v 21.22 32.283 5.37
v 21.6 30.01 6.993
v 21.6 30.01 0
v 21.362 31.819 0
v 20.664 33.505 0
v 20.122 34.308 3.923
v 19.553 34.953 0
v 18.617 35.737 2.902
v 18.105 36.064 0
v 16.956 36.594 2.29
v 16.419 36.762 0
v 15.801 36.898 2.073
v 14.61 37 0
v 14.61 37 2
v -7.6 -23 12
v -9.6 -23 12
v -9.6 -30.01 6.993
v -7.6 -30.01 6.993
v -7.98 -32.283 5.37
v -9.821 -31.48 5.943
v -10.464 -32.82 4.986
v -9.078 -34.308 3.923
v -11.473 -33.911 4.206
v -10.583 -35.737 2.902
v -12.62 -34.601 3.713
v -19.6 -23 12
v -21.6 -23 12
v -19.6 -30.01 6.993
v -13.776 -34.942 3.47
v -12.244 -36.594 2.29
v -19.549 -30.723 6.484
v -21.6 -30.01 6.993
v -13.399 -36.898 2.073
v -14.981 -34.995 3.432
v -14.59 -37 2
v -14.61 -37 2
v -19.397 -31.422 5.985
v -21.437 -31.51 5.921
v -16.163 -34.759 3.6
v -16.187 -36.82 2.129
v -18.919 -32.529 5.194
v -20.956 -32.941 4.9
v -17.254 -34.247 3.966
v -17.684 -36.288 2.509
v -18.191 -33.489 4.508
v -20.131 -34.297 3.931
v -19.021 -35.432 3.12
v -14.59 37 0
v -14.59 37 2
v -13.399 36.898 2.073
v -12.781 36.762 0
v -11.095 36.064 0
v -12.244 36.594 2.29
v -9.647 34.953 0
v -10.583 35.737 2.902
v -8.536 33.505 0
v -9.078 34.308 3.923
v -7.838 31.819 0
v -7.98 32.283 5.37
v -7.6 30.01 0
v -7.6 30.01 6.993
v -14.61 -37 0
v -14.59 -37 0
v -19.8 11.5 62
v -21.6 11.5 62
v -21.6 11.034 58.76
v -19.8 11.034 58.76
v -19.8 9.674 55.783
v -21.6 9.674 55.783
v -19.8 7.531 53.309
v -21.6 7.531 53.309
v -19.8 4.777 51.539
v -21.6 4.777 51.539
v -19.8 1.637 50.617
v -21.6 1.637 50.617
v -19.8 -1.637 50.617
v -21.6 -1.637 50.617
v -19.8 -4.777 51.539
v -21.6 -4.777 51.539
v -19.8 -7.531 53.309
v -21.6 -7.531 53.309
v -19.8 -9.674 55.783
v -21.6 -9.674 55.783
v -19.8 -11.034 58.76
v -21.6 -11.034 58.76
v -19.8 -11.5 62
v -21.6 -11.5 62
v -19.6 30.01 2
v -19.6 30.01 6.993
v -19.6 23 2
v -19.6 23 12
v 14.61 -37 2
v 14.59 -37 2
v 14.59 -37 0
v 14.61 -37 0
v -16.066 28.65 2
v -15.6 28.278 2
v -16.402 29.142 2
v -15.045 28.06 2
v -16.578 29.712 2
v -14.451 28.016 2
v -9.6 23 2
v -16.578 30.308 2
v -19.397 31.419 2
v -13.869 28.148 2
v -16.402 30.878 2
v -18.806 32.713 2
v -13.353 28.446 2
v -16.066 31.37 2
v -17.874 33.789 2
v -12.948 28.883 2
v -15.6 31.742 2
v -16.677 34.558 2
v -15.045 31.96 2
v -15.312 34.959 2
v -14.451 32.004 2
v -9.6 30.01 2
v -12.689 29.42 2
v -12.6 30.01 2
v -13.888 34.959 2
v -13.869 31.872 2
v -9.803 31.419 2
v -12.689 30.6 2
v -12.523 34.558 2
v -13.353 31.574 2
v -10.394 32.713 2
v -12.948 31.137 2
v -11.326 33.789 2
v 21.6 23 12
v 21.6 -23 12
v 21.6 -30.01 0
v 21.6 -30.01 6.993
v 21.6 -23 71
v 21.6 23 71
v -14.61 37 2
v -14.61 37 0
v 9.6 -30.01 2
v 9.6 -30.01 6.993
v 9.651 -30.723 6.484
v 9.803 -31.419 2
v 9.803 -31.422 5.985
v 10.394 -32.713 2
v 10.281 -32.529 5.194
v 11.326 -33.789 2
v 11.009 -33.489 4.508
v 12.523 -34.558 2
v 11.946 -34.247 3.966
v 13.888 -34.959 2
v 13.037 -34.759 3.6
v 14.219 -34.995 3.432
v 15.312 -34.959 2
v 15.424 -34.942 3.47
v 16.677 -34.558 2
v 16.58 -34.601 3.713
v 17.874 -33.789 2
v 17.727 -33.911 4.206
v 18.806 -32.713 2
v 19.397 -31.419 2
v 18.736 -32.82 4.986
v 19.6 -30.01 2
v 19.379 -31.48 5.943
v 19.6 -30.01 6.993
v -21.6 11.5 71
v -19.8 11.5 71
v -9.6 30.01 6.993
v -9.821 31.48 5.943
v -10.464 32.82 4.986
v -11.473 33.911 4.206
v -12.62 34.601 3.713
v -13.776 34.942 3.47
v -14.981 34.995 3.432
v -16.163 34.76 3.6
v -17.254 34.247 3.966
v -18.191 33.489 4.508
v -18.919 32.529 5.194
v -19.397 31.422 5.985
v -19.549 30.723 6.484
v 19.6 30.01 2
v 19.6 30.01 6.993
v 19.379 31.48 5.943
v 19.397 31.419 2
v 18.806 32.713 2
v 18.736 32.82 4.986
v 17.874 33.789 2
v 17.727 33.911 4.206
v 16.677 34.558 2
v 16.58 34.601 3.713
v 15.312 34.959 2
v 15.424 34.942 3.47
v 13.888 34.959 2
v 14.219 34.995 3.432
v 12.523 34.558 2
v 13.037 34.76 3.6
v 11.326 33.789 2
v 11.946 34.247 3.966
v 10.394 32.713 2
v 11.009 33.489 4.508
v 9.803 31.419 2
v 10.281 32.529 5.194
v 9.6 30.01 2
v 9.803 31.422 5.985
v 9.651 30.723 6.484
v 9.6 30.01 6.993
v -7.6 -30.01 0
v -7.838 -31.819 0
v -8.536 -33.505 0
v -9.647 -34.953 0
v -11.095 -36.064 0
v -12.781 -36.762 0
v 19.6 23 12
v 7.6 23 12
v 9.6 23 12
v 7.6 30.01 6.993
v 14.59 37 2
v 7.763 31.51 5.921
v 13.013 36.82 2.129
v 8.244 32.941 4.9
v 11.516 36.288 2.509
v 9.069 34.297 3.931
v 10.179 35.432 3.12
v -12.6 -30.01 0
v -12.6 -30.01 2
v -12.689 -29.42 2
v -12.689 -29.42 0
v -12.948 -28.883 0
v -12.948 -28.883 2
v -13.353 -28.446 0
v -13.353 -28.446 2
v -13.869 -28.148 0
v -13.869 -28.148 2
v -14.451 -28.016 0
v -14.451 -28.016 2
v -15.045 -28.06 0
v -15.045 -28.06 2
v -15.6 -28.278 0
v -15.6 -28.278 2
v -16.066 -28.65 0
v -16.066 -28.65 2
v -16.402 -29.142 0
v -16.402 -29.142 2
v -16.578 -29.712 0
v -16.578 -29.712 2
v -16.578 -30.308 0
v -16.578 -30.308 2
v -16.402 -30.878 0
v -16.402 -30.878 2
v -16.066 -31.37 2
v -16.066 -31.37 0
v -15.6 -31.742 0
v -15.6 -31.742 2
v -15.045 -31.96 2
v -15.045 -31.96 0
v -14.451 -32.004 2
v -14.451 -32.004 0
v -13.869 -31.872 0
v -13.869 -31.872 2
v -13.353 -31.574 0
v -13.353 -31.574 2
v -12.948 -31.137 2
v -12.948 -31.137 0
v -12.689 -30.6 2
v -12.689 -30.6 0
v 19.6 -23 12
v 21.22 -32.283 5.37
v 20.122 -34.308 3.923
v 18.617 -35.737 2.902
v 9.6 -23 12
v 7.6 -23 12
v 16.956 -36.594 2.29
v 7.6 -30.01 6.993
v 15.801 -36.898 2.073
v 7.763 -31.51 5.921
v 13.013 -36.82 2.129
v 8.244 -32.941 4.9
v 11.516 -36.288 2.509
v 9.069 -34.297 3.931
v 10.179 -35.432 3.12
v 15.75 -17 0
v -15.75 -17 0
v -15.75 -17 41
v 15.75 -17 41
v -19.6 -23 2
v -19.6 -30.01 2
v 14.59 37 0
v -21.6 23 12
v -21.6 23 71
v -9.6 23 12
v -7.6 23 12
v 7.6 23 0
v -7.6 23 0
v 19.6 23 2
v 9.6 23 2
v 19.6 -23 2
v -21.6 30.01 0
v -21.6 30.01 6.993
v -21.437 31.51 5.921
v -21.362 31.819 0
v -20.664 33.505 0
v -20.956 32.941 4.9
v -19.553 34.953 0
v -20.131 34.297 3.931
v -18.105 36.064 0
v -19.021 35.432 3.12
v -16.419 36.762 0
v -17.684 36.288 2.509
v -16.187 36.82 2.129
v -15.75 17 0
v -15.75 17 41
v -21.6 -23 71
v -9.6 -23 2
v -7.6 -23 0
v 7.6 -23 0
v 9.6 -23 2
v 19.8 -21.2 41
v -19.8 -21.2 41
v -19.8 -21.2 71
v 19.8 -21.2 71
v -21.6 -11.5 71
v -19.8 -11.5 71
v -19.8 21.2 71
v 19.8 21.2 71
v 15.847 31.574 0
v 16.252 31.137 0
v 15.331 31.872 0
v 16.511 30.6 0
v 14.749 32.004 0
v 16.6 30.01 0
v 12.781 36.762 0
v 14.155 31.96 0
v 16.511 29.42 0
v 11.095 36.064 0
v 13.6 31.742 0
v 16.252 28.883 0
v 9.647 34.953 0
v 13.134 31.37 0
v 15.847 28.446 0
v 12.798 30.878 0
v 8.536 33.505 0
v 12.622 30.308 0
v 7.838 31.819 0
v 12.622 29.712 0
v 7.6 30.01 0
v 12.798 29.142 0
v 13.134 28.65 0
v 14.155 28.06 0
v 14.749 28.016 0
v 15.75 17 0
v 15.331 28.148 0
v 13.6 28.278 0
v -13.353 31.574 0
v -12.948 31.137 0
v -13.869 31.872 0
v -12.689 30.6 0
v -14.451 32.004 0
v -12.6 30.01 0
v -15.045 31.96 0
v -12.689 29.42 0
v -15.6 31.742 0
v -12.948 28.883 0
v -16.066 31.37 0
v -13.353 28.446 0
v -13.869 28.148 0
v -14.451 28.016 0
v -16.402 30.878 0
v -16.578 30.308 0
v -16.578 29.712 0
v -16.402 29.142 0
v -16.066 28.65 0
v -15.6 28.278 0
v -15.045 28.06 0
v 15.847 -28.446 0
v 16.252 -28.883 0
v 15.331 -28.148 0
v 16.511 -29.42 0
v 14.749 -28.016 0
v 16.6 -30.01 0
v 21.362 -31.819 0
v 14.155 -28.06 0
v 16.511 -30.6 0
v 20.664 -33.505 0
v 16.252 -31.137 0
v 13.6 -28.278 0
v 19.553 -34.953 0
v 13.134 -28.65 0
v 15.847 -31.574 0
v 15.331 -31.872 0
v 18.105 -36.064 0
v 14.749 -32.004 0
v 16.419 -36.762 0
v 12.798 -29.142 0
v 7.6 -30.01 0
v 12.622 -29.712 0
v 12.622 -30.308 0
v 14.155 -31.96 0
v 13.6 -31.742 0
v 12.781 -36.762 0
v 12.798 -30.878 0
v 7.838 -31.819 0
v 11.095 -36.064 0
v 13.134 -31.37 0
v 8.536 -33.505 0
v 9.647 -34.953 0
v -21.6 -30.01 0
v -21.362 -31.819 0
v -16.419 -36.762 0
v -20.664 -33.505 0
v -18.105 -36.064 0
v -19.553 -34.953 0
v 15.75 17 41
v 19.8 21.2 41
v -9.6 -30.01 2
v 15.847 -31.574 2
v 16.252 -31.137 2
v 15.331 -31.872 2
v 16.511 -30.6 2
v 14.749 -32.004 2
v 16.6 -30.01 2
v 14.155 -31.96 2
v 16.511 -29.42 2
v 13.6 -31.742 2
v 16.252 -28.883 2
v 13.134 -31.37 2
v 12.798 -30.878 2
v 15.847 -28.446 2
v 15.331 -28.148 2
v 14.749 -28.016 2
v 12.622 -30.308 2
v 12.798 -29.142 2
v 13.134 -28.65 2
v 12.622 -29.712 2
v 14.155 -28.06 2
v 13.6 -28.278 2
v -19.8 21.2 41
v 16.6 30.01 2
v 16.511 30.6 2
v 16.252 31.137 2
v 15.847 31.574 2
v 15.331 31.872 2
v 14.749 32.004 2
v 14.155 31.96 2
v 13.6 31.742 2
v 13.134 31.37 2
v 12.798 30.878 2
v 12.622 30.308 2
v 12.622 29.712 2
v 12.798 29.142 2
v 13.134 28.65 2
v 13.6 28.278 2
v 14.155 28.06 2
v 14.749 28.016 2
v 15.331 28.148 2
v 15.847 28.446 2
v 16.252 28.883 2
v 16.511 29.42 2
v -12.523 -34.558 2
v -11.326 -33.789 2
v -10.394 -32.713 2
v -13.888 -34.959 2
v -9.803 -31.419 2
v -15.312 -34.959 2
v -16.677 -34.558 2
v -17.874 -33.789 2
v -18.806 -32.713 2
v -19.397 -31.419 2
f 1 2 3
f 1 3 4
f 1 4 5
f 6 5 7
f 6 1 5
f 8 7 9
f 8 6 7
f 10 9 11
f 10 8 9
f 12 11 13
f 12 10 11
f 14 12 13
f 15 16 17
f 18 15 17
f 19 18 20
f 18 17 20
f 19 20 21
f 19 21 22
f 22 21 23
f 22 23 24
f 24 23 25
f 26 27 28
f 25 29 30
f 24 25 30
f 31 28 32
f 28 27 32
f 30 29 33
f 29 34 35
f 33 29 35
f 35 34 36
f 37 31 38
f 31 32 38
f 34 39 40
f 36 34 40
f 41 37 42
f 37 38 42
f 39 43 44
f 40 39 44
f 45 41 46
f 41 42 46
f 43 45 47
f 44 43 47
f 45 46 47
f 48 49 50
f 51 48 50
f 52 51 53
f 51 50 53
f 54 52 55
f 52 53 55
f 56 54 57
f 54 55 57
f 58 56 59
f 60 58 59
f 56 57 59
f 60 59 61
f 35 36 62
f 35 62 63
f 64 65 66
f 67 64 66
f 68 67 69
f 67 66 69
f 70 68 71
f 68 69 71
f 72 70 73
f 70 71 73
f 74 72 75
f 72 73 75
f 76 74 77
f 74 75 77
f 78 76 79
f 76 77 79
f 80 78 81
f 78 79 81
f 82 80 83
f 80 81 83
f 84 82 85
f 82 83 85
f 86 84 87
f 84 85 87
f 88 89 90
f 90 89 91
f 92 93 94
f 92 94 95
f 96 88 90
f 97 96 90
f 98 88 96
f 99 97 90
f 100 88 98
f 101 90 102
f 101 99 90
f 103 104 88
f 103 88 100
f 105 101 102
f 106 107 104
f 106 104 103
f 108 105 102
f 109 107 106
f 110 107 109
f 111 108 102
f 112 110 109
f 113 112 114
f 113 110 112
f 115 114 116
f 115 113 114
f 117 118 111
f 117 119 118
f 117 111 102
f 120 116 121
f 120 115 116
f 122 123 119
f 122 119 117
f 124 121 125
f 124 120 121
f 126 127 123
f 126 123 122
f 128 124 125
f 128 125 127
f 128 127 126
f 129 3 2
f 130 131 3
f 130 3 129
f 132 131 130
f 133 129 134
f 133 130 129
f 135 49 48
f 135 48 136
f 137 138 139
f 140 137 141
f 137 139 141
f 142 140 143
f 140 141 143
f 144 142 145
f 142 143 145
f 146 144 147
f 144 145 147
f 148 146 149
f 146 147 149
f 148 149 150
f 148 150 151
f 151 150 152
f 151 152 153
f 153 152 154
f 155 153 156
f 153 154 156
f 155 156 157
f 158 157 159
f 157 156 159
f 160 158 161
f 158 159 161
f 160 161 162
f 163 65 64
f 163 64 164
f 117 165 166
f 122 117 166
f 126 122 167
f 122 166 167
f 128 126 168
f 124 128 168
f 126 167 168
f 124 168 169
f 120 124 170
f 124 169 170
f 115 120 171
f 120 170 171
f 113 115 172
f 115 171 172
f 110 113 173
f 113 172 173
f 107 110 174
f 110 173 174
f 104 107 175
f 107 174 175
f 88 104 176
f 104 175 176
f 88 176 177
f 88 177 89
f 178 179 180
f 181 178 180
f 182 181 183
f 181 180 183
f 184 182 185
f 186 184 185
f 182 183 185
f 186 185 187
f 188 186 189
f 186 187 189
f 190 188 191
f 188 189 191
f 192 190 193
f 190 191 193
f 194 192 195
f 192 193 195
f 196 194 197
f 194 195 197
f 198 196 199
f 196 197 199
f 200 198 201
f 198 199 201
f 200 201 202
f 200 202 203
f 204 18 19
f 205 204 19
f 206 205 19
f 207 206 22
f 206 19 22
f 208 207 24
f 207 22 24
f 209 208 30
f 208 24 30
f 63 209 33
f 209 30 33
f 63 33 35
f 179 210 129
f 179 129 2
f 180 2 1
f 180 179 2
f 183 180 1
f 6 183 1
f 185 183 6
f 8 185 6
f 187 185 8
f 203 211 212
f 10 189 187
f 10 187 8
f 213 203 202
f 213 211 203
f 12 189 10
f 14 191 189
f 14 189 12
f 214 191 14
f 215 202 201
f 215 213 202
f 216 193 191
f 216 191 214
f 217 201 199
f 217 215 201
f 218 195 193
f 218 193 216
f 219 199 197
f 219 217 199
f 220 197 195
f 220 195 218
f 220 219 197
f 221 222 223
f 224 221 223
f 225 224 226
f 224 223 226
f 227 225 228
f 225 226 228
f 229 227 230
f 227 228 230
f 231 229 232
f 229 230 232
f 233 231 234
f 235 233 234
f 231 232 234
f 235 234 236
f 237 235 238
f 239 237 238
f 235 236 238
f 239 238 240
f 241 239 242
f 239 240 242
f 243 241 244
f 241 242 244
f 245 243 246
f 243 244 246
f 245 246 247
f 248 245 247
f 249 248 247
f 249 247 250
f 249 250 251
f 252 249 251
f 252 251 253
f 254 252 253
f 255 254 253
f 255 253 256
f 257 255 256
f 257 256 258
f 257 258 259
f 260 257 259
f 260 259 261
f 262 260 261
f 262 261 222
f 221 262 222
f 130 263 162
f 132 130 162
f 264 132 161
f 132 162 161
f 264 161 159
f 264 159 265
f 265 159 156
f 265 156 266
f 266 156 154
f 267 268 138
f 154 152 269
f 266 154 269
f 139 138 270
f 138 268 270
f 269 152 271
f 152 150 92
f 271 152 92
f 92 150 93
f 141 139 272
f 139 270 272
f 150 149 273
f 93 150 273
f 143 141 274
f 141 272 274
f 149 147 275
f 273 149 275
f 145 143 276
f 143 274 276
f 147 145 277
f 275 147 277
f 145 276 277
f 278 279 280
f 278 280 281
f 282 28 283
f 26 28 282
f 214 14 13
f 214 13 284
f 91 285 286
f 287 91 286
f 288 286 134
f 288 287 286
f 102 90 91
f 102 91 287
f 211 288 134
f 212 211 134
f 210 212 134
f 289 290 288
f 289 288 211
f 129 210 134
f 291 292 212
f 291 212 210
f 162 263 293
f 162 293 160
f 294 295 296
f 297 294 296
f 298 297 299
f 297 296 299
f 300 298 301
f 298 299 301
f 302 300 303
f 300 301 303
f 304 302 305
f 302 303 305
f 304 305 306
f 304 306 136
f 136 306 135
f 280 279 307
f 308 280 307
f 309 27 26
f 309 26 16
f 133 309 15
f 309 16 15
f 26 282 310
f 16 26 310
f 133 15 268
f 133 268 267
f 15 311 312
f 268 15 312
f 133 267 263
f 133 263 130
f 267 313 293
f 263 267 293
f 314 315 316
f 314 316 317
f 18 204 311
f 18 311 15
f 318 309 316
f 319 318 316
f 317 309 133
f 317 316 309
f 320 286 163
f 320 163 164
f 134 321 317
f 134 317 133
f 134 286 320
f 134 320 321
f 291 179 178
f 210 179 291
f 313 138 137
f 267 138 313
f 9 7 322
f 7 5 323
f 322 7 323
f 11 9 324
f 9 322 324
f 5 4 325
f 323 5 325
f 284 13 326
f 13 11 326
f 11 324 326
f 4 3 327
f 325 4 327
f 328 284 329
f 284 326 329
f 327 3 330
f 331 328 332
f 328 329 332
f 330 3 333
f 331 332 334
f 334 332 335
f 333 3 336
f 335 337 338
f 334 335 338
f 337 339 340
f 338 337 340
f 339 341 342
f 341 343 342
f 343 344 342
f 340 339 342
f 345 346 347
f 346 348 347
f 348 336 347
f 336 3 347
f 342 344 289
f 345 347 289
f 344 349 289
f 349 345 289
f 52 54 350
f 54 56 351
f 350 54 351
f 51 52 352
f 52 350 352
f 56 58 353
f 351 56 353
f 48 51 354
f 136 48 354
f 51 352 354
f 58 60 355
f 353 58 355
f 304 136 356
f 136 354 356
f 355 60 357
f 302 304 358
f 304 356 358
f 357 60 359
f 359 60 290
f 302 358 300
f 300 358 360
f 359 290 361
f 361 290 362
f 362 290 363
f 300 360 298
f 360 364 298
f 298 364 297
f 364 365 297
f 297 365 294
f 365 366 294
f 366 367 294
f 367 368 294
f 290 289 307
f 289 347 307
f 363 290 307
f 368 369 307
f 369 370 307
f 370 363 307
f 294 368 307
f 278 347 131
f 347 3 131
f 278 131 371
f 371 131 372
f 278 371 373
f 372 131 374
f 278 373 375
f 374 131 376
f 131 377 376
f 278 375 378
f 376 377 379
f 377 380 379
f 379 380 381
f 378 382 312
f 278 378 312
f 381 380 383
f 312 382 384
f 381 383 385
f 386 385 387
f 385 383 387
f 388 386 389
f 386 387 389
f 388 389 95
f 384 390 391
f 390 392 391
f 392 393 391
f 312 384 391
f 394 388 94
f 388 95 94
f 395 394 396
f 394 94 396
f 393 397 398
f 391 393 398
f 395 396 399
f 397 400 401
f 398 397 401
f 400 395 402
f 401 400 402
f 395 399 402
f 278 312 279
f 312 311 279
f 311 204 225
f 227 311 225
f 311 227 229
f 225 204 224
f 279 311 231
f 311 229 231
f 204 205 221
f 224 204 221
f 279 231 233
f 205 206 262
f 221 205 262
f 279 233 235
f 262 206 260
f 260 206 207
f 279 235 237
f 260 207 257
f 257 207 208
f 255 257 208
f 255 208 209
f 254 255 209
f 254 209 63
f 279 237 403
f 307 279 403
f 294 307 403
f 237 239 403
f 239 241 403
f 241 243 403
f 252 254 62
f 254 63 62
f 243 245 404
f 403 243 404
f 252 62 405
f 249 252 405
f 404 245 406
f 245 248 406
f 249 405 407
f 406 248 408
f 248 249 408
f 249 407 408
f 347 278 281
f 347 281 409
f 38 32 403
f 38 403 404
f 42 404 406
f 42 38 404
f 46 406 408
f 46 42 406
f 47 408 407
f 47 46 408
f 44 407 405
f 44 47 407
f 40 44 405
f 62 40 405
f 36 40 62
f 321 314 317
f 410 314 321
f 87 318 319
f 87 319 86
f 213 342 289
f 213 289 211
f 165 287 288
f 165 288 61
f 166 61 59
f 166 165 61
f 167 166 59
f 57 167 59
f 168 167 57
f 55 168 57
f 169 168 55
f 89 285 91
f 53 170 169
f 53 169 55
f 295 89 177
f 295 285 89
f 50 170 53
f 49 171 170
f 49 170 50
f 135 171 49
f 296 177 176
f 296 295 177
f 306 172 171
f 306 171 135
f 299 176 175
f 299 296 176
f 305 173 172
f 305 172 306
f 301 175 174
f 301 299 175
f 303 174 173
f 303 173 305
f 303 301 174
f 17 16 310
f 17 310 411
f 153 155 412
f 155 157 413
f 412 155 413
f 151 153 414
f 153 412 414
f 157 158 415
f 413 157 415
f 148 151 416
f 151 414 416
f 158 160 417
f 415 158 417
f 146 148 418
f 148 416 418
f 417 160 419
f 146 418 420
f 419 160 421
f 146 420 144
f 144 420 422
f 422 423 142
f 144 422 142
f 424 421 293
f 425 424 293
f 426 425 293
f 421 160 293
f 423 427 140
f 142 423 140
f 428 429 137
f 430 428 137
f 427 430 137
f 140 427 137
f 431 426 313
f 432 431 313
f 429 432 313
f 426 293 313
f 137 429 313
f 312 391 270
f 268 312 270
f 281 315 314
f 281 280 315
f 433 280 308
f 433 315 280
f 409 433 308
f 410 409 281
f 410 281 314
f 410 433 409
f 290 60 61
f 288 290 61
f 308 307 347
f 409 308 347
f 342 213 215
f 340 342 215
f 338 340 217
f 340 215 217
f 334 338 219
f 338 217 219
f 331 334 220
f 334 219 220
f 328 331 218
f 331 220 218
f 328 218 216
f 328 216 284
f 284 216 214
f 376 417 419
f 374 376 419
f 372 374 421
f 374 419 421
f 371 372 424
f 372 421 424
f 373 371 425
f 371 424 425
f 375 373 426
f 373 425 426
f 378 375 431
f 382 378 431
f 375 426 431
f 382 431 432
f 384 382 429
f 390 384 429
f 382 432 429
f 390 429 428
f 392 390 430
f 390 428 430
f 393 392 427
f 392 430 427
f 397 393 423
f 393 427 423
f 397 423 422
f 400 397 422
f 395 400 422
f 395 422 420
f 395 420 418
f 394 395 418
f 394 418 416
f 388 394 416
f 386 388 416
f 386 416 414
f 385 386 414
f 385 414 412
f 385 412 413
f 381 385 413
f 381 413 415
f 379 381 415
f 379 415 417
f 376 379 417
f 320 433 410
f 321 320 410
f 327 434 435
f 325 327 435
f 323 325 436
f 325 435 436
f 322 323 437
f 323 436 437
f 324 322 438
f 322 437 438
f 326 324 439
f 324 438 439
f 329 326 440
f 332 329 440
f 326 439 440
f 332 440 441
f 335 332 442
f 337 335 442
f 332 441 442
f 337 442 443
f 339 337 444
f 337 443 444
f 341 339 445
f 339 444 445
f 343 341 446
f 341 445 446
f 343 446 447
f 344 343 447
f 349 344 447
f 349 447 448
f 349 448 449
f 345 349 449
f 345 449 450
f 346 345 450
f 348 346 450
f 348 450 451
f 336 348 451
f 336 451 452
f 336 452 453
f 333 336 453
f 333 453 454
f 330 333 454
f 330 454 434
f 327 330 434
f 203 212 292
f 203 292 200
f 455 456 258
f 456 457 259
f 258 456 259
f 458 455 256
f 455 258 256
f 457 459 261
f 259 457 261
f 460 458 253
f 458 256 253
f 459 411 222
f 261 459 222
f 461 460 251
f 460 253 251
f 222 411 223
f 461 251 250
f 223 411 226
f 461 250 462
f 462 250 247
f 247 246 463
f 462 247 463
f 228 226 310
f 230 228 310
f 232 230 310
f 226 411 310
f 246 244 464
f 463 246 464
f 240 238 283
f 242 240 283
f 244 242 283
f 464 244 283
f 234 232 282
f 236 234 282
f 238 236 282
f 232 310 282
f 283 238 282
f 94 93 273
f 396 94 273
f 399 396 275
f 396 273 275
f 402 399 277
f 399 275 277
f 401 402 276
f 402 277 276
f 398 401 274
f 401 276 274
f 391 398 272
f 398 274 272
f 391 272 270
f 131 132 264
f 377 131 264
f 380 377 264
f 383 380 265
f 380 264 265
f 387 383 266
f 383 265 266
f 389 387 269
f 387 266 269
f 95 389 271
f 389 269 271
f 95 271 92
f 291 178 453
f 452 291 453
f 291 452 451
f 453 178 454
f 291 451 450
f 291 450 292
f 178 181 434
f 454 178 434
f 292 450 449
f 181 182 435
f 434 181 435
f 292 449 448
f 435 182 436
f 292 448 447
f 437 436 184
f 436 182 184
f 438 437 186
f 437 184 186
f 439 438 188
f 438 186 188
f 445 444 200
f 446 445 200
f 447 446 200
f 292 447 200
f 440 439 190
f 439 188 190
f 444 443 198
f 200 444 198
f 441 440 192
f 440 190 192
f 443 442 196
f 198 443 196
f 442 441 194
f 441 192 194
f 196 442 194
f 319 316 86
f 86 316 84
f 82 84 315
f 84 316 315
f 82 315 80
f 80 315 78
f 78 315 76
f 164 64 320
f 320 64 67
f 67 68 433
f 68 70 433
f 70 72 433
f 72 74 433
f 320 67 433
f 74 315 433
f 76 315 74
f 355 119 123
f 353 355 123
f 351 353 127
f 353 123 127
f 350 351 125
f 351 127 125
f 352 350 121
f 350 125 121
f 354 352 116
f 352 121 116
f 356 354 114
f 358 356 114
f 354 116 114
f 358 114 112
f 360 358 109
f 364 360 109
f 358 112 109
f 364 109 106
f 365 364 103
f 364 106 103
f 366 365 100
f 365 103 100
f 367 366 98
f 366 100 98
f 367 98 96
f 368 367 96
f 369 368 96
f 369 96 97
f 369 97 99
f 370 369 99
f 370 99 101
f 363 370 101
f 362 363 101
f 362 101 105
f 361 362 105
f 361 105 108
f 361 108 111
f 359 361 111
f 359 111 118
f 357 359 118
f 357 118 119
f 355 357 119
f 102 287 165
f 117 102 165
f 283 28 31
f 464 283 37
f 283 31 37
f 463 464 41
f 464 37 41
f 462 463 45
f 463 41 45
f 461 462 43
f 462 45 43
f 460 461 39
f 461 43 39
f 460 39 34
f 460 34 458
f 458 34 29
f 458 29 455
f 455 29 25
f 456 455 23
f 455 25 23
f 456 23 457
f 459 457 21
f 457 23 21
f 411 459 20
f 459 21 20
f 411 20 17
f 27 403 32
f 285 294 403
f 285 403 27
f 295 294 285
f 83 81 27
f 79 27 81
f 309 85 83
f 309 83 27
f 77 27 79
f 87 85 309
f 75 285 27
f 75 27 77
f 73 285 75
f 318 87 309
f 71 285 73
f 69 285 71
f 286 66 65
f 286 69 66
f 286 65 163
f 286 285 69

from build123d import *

# Parameters (mm, degrees)
SKETCH_W        = 43.2
SKETCH_H        = 46
SKETCH_W_2      = 31.5
SKETCH_H_2      = 34
PAD_DEPTH       = 41
SKETCH001_W     = 43.2
SKETCH001_H     = 46
SKETCH001_W_2   = 39.6
SKETCH001_H_2   = 42.4
PAD001_DEPTH    = 30
POCKET_DEPTH    = 5
SKETCH003_W     = 14
SKETCH003_H     = 12
PAD002_DEPTH    = 14
FILLET_R        = 6.99
POCKET001_DEPTH = 10
POCKET002_DEPTH = 43.201
SKETCH006_R     = 2
POCKET003_DEPTH = 2.001
SKETCH007_W     = 14
SKETCH007_H     = 12
PAD003_DEPTH    = 14
FILLET001_R     = 6.99
POCKET004_DEPTH = 10
POCKET005_DEPTH = 43.201
SKETCH010_R     = 2
POCKET006_DEPTH = 2.001


with BuildPart() as part:
    # Sketch → Pad (new body)
    with BuildSketch(Plane.XY):
        Rectangle(SKETCH_W, SKETCH_H)
        Rectangle(SKETCH_W_2, SKETCH_H_2, mode=Mode.SUBTRACT)
    extrude(amount=PAD_DEPTH)

    # Sketch001 → Pad001 (new body)
    with BuildSketch(Plane.XY.offset(41)):
        Rectangle(SKETCH001_W, SKETCH001_H)
        Rectangle(SKETCH001_W_2, SKETCH001_H_2, mode=Mode.SUBTRACT)
    extrude(amount=PAD001_DEPTH)

    # Sketch002 → Pocket (cut)
    with BuildSketch(Plane(origin=(-21.6, 0, 0), x_dir=(0, -1, 0), z_dir=(-1, 0, 0))):
        with BuildLine():
            Line((-11.5, 71), (11.5, 71))
            Line((11.5, 71), (11.5, 62.000009))
            ThreePointArc((-11.5, 61.999999), (5e-06, 50.5), (11.5, 62.000009))
            Line((-11.5, 61.999999), (-11.5, 71))
        make_face()
    extrude(amount=-POCKET_DEPTH, mode=Mode.SUBTRACT)

    # Sketch003 → Pad002 (new body)
    with BuildSketch(Plane.XZ.offset(23)):
        with Locations((-14.6, 6)):
            Rectangle(SKETCH003_W, SKETCH003_H)
        with Locations((14.6, 6)):
            Rectangle(SKETCH003_W, SKETCH003_H)
    extrude(amount=PAD002_DEPTH)

    # Fillet
    fillet_edges = [part.edges().sort_by_distance(p)[0] for p in [
        (-21.6, -37, 6),
        (-7.6, -37, 6),
        (7.6, -37, 6),
        (21.6, -37, 6),
    ]]
    fillet(fillet_edges, radius=FILLET_R)

    # Sketch004 → Pocket001 (cut)
    with BuildSketch(Plane.XY.offset(12)):
        with BuildLine():
            Line((-19.6, -23), (-9.6, -23))
            Line((-9.6, -23), (-9.6, -30.009996))
            ThreePointArc((-19.6, -30.009995), (-14.6, -35.009995), (-9.6, -30.009996))
            Line((-19.6, -30.009995), (-19.6, -23))
        make_face()
        with BuildLine():
            Line((9.6, -23), (19.6, -23))
            Line((19.6, -23), (19.6, -30.009994))
            ThreePointArc((9.6, -30.009994), (14.6, -35.009995), (19.6, -30.009994))
            Line((9.6, -30.009994), (9.6, -23))
        make_face()
    extrude(amount=-POCKET001_DEPTH, mode=Mode.SUBTRACT)

    # Sketch005 → Pocket002 (cut, through all)
    with BuildSketch(Plane(origin=(-21.6, 0, 0), x_dir=(0, -1, 0), z_dir=(-1, 0, 0))):
        Polygon((23, 12), (37, 2), (37, 12), align=None)
    extrude(amount=-POCKET002_DEPTH, mode=Mode.SUBTRACT)

    # Sketch006 → Pocket003 (cut, through all)
    with BuildSketch(Plane.XY.offset(2)):
        with Locations((-14.6, -30.009995)):
            Circle(SKETCH006_R)
        with Locations((14.6, -30.009995)):
            Circle(SKETCH006_R)
    extrude(amount=-POCKET003_DEPTH, mode=Mode.SUBTRACT)

    # Sketch007 → Pad003 (new body)
    with BuildSketch(Plane(origin=(0, 23, 0), x_dir=(-1, 0, 0), z_dir=(0, 1, 0))):
        with Locations((-14.6, 6)):
            Rectangle(SKETCH007_W, SKETCH007_H)
        with Locations((14.6, 6)):
            Rectangle(SKETCH007_W, SKETCH007_H)
    extrude(amount=PAD003_DEPTH)

    # Fillet001
    fillet001_edges = [part.edges().sort_by_distance(p)[0] for p in [
        (21.6, 37, 6),
        (7.6, 37, 6),
        (-7.6, 37, 6),
        (-21.6, 37, 6),
    ]]
    fillet(fillet001_edges, radius=FILLET001_R)

    # Sketch008 → Pocket004 (cut)
    with BuildSketch(Plane.XY.offset(12)):
        with BuildLine():
            Line((-19.6, 23), (-9.6, 23))
            Line((-9.6, 23), (-9.6, 30.009983))
            ThreePointArc((-9.6, 30.009983), (-14.6, 35.009995), (-19.6, 30.009983))
            Line((-19.6, 30.009983), (-19.6, 23))
        make_face()
        with BuildLine():
            Line((19.6, 30.009983), (19.6, 23))
            Line((19.6, 23), (9.6, 23))
            Line((9.6, 23), (9.6, 30.009983))
            ThreePointArc((19.6, 30.009983), (14.6, 35.009995), (9.6, 30.009983))
        make_face()
    extrude(amount=-POCKET004_DEPTH, mode=Mode.SUBTRACT)

    # Sketch009 → Pocket005 (cut, through all)
    with BuildSketch(Plane(origin=(-21.6, 0, 0), x_dir=(0, -1, 0), z_dir=(-1, 0, 0))):
        Polygon((-23, 12), (-37, 2), (-37, 12), align=None)
    extrude(amount=-POCKET005_DEPTH, mode=Mode.SUBTRACT)

    # Sketch010 → Pocket006 (cut, through all)
    with BuildSketch(Plane.XY.offset(2)):
        with Locations((-14.6, 30.009995)):
            Circle(SKETCH010_R)
        with Locations((14.6, 30.009995)):
            Circle(SKETCH010_R)
    extrude(amount=-POCKET006_DEPTH, mode=Mode.SUBTRACT)


solid = part.part
